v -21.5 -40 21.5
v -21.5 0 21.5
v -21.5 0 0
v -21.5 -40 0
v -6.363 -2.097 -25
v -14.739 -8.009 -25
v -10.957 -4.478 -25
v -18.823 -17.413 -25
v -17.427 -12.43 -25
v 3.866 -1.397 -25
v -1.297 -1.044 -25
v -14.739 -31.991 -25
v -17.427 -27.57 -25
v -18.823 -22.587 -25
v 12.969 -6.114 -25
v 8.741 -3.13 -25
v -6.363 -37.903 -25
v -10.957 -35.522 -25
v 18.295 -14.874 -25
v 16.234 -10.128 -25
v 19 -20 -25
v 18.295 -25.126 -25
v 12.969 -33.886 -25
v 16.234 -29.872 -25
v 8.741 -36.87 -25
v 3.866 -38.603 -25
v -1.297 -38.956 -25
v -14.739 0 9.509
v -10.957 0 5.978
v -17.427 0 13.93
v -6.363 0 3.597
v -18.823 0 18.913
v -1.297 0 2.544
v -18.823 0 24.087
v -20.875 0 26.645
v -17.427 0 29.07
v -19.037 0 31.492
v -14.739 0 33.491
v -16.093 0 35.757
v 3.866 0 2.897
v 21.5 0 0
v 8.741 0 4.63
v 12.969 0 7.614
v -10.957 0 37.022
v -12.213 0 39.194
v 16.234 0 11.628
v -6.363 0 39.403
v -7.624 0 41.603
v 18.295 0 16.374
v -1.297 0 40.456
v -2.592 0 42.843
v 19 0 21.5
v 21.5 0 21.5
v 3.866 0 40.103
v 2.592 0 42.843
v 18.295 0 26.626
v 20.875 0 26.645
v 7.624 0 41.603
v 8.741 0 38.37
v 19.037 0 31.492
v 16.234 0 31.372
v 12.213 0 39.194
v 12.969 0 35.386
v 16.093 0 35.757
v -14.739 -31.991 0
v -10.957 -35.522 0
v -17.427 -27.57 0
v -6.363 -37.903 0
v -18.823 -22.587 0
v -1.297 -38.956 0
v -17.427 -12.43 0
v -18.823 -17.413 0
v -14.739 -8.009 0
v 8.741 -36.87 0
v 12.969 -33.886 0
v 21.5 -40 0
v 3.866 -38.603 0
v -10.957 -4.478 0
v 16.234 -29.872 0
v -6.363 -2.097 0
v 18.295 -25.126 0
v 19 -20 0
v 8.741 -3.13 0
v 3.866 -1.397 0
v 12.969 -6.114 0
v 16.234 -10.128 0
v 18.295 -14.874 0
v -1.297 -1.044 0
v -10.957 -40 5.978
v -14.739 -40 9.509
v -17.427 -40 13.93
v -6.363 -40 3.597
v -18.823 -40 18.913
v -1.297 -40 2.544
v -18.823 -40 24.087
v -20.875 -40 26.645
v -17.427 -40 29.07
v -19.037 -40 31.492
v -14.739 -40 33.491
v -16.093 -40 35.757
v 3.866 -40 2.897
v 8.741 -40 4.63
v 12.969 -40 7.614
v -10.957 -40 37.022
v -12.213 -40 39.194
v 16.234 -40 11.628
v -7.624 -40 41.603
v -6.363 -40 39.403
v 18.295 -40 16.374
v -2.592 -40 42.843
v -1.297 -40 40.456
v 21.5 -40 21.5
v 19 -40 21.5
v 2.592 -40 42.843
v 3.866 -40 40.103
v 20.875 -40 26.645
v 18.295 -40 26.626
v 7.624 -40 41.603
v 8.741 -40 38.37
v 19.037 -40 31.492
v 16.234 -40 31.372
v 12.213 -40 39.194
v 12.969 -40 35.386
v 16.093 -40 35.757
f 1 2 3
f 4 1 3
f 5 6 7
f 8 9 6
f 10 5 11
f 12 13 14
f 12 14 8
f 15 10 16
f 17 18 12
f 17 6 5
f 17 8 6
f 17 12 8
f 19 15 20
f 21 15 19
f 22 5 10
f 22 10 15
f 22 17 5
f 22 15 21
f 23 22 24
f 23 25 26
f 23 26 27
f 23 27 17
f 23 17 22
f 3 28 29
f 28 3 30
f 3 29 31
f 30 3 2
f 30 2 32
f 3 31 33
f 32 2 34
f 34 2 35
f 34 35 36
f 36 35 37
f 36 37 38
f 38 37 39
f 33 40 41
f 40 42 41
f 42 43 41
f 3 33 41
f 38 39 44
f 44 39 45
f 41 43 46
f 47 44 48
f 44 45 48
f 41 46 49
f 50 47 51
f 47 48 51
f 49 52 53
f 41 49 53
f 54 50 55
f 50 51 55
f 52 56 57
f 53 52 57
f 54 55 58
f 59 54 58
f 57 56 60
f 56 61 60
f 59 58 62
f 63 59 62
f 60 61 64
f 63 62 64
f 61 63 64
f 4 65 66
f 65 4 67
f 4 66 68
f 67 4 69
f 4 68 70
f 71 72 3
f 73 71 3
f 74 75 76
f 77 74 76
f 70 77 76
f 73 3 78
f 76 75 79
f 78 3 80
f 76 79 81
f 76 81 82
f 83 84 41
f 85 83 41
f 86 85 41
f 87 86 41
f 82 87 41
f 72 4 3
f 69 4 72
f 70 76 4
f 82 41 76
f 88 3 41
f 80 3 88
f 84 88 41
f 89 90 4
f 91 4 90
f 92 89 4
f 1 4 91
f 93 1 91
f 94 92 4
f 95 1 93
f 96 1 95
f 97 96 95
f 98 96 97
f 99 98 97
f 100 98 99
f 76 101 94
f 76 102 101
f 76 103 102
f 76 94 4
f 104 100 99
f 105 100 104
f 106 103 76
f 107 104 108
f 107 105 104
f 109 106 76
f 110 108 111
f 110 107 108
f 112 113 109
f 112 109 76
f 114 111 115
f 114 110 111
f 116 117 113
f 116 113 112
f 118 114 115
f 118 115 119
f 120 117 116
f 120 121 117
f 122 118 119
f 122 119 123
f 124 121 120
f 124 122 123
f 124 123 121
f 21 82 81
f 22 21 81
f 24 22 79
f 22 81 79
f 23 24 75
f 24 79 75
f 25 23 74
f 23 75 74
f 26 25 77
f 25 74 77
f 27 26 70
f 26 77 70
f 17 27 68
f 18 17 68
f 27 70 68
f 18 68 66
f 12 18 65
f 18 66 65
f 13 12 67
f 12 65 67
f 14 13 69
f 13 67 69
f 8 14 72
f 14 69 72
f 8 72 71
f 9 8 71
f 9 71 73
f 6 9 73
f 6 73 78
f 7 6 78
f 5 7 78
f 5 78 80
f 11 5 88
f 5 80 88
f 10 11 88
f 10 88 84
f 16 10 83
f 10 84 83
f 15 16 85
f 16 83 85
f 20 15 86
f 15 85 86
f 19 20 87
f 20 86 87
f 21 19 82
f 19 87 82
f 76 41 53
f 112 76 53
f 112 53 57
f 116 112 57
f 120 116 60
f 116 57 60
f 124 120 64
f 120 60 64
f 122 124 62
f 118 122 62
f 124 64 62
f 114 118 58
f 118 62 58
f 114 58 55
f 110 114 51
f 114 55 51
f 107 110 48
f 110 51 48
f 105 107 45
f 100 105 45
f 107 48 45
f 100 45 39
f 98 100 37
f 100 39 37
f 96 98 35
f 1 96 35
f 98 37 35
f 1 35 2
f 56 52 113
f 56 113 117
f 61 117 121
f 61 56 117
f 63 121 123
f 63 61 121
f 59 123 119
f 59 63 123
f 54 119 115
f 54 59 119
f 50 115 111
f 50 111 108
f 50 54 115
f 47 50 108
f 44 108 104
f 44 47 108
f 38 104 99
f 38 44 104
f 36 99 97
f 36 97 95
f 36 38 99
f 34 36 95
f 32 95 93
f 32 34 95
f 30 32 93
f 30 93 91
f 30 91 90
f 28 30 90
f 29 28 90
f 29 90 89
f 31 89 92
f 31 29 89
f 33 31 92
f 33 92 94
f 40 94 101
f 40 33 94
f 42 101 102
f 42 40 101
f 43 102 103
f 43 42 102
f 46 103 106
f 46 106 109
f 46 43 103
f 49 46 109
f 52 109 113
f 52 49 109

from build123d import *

# Parameters (mm, degrees)
F0_R     = 19
F1_DEPTH = 40
F2_R     = 19
F3_DEPTH = 25


with BuildPart() as f1:
    # F0 (on Front) → F1 (new body)
    with BuildSketch(Plane.XZ):
        with BuildLine():
            ThreePointArc((0, 0), (15.202796, 6.297204), (21.5, 21.5))
            ThreePointArc((21.5, 21.5), (0, 43), (-21.5, 21.5))
            ThreePointArc((-21.5, 21.5), (-15.202796, 6.297204), (0, 0))
        make_face()
        with Locations((0, 21.5)):
            Circle(F0_R, mode=Mode.SUBTRACT)
        with BuildLine():
            Line((21.5, 0), (21.5, 21.5))
            ThreePointArc((21.5, 21.5), (15.202796, 6.297204), (0, 0))
            Line((0, 0), (21.5, 0))
        make_face()
        with BuildLine():
            ThreePointArc((0, 0), (-15.202796, 6.297204), (-21.5, 21.5))
            Line((-21.5, 21.5), (-21.5, 0))
            Line((-21.5, 0), (0, 0))
        make_face()
    extrude(amount=F1_DEPTH)

    # F2 (on face) → F3 (join)
    with BuildSketch(Plane(origin=(0, 0, 0), x_dir=(1, 0, 0), z_dir=(0, 0, -1))):
        with Locations((0, 20)):
            Circle(F2_R)
    extrude(amount=F3_DEPTH)


solid = f1.part
